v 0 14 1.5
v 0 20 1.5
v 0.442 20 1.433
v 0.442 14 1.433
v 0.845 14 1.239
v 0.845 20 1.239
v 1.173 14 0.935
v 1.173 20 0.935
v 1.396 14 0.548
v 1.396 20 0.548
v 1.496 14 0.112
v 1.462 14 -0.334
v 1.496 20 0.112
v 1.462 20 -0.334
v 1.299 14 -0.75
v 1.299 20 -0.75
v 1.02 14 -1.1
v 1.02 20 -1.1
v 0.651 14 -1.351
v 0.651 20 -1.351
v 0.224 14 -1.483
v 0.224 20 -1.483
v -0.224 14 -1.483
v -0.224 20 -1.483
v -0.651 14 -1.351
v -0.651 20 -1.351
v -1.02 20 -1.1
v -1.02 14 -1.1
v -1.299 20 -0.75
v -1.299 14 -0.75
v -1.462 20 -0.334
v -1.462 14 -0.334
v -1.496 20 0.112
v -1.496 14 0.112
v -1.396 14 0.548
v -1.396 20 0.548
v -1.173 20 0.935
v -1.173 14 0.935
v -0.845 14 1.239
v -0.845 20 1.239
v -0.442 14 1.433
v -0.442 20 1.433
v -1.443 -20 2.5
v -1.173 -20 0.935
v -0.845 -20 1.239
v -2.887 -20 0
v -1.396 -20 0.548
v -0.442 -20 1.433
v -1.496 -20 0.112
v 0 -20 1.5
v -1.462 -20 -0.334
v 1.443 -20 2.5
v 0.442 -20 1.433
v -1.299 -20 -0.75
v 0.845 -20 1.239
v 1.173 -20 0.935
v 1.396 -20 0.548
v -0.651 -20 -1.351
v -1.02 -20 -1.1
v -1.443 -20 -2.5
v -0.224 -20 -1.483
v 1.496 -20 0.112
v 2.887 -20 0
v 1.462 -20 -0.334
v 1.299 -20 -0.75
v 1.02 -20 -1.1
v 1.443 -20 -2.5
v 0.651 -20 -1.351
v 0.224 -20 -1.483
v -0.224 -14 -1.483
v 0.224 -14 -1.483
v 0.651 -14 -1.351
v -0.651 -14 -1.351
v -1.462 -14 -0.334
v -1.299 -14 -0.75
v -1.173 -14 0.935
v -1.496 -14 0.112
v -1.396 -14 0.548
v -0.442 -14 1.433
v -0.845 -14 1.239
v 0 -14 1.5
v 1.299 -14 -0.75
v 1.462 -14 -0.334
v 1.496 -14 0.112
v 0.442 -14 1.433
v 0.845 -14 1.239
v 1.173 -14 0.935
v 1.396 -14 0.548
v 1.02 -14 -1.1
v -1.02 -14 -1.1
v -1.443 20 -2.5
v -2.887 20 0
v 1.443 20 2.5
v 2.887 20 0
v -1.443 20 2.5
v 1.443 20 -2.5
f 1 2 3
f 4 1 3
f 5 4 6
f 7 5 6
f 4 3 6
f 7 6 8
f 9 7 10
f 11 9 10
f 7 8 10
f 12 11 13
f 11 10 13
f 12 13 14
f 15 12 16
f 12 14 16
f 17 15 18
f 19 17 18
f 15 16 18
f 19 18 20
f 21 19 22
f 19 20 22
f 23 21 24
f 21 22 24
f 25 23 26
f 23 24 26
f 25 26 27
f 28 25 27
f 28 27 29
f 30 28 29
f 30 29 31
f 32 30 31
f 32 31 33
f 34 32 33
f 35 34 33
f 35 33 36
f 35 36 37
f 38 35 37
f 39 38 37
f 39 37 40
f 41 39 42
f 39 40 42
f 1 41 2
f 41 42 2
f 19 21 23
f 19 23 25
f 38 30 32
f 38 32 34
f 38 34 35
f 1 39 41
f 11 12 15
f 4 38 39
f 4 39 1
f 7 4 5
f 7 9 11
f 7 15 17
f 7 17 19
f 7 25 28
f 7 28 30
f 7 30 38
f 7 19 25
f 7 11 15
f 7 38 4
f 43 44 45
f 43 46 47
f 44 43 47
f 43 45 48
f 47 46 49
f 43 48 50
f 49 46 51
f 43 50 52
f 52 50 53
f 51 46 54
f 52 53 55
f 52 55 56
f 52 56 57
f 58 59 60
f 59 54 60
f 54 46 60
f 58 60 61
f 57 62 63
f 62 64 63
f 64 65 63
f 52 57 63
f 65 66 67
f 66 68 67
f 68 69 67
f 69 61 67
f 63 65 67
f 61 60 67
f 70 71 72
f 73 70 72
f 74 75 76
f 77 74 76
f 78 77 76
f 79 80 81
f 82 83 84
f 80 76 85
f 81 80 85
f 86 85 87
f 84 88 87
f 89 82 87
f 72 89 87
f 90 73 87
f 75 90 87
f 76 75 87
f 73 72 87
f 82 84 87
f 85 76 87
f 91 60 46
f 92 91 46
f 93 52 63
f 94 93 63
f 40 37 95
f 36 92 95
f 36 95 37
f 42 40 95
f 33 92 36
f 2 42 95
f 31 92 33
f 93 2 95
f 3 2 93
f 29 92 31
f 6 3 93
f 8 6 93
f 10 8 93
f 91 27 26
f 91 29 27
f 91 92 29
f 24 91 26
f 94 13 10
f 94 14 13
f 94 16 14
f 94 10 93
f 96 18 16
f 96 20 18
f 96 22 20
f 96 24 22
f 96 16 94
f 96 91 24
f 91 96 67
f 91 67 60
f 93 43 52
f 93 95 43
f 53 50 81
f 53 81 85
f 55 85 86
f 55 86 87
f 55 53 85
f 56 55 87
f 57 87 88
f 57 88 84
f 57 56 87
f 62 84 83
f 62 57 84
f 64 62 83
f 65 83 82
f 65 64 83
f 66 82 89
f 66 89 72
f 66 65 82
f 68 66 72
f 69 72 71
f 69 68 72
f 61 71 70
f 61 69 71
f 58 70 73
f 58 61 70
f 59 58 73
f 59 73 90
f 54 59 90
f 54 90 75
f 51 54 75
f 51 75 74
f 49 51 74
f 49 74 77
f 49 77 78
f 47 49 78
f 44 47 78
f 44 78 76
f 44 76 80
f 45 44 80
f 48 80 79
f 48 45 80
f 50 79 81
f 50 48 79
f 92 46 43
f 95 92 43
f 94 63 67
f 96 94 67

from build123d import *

# Parameters (mm, degrees)
BOSS_EXTRUDE1_DEPTH                        = 20
SKETCH2_R                                  = 1.5
CUT_EXTRUDE1_DEPTH                         = 6
MIRROR1_AT_THE_SECOND_PLANE_COPY_1_SKETC_R = 1.5
MIRROR1_AT_THE_SECOND_PLANE_COPY_1_DEPTH   = 6


with BuildPart() as part:
    # Sketch1 → Boss-Extrude1 (new, symmetric)
    with BuildSketch(Plane(origin=(0, 0, 0), x_dir=(1, 0, 0), z_dir=(0, 1, 0))):
        Polygon((2.886751346, 0), (1.443375673, 2.5), (-1.443375673, 2.5), (-2.886751346, 0), (-1.443375673, -2.5), (1.443375673, -2.5), align=None)
    extrude(amount=BOSS_EXTRUDE1_DEPTH, both=True)

    # Sketch2 → Cut-Extrude1 (cut)
    with BuildSketch(Plane(origin=(0, 20, 0), x_dir=(1, 0, 0), z_dir=(0, 1, 0))):
        with Locations(Location((0, 0, 0), (0, 0, 270))):
            Circle(SKETCH2_R)
    cut_extrude1 = extrude(amount=-CUT_EXTRUDE1_DEPTH, mode=Mode.SUBTRACT)

    # Mirror1: Cut-Extrude1 across plane
    add(cut_extrude1.mirror(Plane(origin=(0, 0, 0), x_dir=(0, 0, 1), z_dir=(1, 0, 0))), mode=Mode.SUBTRACT)

    # Mirror1 at the second plane: Cut-Extrude1 across plane
    add(cut_extrude1.mirror(Plane.ZX), mode=Mode.SUBTRACT)

    # Mirror1 at the second plane copy 1 sketc → Mirror1 at the second plane copy 1 (cut)
    with BuildSketch(Plane(origin=(0, -20, 0), x_dir=(-1, 0, 0), z_dir=(0, -1, 0))):
        with Locations(Location((0, 0, 0), (0, 0, 270))):
            Circle(MIRROR1_AT_THE_SECOND_PLANE_COPY_1_SKETC_R)
    extrude(amount=-MIRROR1_AT_THE_SECOND_PLANE_COPY_1_DEPTH, mode=Mode.SUBTRACT)


solid = part.part
